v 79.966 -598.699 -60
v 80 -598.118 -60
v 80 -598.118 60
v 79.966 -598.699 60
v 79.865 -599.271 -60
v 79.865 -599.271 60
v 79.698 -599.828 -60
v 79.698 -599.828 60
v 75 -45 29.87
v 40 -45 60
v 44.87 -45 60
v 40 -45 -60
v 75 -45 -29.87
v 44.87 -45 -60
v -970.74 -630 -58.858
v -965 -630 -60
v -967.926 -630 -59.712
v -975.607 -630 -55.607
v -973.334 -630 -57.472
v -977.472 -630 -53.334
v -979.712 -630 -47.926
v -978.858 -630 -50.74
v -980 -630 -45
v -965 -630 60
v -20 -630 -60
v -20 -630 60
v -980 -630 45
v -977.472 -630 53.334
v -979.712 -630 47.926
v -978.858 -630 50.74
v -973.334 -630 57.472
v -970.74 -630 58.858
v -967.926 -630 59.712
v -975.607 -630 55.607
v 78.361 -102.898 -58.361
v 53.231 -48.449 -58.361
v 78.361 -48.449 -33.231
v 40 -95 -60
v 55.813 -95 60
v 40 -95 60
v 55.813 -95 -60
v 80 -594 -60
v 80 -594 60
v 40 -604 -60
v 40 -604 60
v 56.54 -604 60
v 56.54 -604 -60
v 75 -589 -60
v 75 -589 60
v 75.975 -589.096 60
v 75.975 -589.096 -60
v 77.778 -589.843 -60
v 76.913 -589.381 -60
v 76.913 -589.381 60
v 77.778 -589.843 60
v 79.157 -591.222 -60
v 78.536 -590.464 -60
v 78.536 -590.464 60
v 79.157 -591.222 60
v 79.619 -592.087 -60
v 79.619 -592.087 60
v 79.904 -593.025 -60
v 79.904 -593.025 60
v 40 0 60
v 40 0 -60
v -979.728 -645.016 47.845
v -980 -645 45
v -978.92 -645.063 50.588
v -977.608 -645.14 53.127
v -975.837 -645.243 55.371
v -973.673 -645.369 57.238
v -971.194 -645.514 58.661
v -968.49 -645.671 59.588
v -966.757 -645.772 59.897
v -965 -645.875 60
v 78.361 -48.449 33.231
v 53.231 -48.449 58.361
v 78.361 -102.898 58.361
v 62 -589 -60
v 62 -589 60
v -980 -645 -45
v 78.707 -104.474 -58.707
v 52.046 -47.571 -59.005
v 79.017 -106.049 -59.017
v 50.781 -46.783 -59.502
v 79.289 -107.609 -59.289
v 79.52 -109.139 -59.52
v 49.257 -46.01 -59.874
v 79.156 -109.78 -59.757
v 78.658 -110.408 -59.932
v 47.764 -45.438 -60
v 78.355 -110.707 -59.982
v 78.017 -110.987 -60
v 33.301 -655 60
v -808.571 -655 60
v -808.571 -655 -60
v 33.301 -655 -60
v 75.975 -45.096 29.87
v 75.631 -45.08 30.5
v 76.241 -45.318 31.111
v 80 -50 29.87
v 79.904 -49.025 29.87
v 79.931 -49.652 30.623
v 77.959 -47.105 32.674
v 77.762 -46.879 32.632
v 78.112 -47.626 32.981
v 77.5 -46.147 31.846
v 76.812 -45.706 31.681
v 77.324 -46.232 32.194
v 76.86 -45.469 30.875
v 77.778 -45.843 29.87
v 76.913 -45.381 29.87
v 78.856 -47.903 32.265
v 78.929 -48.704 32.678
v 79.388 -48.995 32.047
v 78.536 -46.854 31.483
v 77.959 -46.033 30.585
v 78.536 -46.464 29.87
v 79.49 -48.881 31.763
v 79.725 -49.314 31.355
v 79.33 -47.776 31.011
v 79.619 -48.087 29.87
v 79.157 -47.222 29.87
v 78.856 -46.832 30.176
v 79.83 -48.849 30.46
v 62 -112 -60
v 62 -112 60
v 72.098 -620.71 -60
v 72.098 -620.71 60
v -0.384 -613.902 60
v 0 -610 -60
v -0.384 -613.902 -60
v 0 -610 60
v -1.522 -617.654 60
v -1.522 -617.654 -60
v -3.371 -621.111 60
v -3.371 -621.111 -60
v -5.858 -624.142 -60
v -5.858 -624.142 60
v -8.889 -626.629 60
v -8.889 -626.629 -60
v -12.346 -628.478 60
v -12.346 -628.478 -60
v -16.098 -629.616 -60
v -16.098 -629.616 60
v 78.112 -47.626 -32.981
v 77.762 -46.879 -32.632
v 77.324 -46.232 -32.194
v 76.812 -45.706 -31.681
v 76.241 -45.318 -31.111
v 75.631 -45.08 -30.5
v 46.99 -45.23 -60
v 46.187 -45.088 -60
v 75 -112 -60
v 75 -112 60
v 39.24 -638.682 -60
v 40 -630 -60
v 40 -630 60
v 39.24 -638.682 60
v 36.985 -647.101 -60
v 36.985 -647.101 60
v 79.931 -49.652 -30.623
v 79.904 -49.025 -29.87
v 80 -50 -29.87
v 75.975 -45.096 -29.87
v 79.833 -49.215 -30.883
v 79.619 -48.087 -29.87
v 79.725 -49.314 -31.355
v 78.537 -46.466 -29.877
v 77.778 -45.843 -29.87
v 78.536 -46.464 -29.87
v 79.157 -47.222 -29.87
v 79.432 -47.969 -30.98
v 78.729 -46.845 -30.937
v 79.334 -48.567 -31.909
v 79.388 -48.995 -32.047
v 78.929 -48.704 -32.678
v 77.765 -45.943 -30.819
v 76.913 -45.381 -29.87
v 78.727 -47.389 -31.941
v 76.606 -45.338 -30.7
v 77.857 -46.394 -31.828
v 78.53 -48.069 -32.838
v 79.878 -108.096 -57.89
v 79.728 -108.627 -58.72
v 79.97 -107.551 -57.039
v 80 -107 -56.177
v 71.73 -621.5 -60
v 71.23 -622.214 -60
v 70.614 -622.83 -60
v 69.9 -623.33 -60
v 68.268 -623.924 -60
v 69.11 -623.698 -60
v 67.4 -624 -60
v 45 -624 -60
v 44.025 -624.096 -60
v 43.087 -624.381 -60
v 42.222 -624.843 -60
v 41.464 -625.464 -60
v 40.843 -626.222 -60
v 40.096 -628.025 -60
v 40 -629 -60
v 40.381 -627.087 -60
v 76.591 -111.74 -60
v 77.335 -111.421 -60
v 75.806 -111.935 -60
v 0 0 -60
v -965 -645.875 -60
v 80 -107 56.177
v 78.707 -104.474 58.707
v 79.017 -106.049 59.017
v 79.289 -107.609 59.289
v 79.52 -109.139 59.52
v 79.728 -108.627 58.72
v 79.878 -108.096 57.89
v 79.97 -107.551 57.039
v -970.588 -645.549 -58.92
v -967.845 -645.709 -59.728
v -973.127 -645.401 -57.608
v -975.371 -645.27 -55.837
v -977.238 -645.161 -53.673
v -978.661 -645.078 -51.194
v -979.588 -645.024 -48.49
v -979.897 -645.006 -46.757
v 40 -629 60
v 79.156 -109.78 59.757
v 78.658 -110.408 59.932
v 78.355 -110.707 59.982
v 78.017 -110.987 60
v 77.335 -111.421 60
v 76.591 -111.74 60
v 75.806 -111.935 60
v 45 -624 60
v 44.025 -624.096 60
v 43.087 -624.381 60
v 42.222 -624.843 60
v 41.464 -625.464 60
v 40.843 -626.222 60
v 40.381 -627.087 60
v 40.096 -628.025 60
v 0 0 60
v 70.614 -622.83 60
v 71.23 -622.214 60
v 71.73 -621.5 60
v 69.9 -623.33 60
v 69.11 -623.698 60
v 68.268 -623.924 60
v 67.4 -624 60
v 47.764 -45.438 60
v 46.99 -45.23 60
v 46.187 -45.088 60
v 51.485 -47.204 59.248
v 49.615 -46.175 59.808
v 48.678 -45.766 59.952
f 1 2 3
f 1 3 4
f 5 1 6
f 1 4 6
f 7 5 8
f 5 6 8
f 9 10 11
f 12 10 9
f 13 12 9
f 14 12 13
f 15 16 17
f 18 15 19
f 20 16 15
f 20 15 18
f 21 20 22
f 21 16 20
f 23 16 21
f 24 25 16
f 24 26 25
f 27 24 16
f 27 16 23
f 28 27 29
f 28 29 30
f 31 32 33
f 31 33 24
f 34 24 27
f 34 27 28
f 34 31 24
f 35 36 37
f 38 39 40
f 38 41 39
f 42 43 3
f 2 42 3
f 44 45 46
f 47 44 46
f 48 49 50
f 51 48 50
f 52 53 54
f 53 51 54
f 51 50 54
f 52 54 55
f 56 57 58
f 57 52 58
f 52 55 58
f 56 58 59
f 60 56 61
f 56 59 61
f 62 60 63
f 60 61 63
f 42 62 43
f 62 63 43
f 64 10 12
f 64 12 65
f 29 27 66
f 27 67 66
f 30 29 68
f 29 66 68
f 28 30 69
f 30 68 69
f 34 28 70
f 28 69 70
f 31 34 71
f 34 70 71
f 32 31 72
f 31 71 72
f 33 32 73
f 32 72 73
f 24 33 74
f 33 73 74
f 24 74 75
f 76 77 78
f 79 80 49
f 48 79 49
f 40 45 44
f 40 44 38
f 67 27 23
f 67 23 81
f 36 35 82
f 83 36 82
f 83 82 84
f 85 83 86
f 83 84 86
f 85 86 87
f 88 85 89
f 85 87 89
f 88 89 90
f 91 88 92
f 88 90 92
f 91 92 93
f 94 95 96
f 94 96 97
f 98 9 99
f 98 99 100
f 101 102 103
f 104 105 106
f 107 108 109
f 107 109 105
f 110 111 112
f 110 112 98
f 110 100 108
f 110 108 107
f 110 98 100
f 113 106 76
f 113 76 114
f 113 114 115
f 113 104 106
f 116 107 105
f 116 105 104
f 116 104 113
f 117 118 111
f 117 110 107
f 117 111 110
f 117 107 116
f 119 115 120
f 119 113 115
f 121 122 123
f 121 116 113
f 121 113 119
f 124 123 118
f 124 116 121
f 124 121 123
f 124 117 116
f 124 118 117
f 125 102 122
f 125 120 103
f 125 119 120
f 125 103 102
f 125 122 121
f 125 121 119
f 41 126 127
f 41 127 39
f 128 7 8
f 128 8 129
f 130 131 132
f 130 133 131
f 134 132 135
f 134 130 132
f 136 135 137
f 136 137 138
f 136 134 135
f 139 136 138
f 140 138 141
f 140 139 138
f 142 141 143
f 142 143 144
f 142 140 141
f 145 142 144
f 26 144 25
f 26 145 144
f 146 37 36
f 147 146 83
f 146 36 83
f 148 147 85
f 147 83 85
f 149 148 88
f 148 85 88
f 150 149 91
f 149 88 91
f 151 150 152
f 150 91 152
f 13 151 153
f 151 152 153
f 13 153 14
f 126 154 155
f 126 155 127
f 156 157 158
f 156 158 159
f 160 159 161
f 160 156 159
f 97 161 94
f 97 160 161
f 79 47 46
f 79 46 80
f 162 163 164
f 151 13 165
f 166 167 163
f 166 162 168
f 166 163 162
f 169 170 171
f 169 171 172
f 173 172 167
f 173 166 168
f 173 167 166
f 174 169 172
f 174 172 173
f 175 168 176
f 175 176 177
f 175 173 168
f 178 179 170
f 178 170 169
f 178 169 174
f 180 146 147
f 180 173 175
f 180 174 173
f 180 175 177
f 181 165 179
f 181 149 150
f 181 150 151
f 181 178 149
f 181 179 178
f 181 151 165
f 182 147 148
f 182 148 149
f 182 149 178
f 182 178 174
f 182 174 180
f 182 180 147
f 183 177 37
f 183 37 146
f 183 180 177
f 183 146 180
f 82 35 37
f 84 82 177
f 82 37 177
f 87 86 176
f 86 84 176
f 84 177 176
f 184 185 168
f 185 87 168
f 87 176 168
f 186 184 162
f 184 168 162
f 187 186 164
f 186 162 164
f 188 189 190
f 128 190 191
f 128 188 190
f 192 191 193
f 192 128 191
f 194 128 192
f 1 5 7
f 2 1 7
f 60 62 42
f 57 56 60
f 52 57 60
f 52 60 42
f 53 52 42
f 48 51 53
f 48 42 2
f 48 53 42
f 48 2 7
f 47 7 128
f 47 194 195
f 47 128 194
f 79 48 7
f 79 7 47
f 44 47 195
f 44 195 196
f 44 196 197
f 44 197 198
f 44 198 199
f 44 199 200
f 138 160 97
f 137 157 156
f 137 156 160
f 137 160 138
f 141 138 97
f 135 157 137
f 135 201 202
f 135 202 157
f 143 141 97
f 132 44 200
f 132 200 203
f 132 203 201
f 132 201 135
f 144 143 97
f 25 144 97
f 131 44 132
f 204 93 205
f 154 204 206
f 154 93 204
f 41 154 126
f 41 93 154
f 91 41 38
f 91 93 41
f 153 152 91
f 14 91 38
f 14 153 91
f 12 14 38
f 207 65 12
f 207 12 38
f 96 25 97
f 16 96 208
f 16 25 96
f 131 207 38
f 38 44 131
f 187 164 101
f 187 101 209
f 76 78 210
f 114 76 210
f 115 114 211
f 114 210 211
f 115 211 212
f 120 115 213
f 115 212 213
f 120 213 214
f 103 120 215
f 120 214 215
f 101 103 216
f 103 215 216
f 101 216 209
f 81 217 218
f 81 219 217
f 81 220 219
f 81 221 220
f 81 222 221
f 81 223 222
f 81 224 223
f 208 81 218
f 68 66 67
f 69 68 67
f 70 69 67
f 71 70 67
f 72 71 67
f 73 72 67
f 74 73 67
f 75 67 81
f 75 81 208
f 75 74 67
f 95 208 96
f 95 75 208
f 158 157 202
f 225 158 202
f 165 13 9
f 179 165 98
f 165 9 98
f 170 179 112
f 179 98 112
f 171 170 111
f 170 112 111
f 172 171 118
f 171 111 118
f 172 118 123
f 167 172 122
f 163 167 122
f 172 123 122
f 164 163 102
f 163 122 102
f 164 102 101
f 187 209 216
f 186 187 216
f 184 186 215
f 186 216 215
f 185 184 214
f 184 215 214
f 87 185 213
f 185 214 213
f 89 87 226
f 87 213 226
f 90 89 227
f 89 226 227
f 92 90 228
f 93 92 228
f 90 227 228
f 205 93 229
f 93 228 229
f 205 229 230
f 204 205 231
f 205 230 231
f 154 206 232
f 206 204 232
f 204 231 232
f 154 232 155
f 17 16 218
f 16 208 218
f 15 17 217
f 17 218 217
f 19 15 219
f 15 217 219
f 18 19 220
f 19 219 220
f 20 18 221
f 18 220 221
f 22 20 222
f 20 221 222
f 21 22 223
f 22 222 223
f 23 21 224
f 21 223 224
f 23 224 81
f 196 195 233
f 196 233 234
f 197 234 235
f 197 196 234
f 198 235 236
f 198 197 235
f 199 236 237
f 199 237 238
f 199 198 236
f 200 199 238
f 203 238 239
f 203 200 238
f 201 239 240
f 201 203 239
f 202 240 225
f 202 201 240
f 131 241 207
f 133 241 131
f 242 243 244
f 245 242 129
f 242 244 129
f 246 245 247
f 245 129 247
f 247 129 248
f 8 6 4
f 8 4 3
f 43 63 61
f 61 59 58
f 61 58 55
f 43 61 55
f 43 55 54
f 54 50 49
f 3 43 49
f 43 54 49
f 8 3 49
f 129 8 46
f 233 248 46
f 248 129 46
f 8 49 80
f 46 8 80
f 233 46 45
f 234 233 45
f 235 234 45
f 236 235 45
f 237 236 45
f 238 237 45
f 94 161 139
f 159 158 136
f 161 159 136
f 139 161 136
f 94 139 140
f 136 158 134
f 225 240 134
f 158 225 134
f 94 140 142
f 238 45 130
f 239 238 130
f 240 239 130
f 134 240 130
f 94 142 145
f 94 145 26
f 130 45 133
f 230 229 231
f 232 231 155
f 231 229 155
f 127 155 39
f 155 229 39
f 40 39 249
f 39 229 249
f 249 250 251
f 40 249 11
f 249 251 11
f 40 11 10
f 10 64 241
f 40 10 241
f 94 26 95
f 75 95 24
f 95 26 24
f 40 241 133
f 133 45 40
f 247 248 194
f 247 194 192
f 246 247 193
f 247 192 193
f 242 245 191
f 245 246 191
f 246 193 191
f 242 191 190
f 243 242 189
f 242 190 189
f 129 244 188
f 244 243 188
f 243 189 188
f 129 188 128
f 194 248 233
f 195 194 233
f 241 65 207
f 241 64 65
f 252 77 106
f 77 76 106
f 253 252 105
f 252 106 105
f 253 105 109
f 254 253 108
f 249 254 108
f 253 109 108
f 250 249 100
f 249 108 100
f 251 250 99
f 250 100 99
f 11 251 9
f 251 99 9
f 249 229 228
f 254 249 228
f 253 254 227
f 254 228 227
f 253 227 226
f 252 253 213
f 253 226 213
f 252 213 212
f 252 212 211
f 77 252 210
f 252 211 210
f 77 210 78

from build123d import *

# Parameters (mm, degrees)
BOSS_EXTRUDE1_DEPTH = 60
FILLET1_R           = 20
FILLET2_R           = 50
SKETCH2_W           = 848.571428571
SKETCH2_H           = 25
CUT_EXTRUDE1_DEPTH  = 1199.832765652
FILLET3_R           = 15
BOSS_EXTRUDE2_DEPTH = 60
CHAMFER1_START      = 59.982172039
CHAMFER1_OUTLINE_W  = 43
CHAMFER1_OUTLINE_H  = 75
CHAMFER1_DEPTH      = 21.017827961
CHAMFER2_START      = 59.982172039
CHAMFER2_OUTLINE_W  = 43
CHAMFER2_OUTLINE_H  = 75
CHAMFER2_DEPTH      = 21.017827961
FILLET4_R           = 5


with BuildPart() as part:
    # Sketch1 → Boss-Extrude1 (new, symmetric)
    with BuildSketch(Plane.XY):
        Polygon((0, 0), (0, -630), (-980, -630), (-980, -645), (-380, -680), (40, -680), (40, 0), align=None)
    extrude(amount=BOSS_EXTRUDE1_DEPTH, both=True)

    # Fillet1
    fillet1_edges = [part.edges().sort_by_distance(p)[0] for p in [
        (0, -630, 0),
    ]]
    fillet(fillet1_edges, radius=FILLET1_R)

    # Fillet2
    fillet2_edges = [part.edges().sort_by_distance(p)[0] for p in [
        (40, -680, 0),
    ]]
    fillet(fillet2_edges, radius=FILLET2_R)

    # Sketch2 → Cut-Extrude1 (cut, through all)
    with BuildSketch(Plane.XY.offset(60)):
        with Locations((-384.285714286, -667.5)):
            Rectangle(SKETCH2_W, SKETCH2_H)
    extrude(amount=-CUT_EXTRUDE1_DEPTH, mode=Mode.SUBTRACT)

    # Fillet3
    fillet3_edges = [part.edges().sort_by_distance(p)[0] for p in [
        (-980, -637.5, 60),
        (-980, -637.5, -60),
    ]]
    fillet(fillet3_edges, radius=FILLET3_R)

    # Sketch4 → Boss-Extrude2 (add, symmetric)
    with BuildSketch(Plane.XY):
        Polygon((40, -45), (80, -45), (80, -112), (62, -112), (55.812506017, -95), (40, -95), align=None)
        Polygon((40, -604), (56.540446486, -604), (62, -589), (80, -589), (80, -599), (70.900744143, -624), (40, -624), align=None)
    extrude(amount=BOSS_EXTRUDE2_DEPTH, both=True)

    # Chamfer1: read off the stored shape, not the designer's step
    # Chamfer1 outline → Chamfer1 (cut)
    with BuildSketch(Plane(origin=(0, 0, 0), x_dir=(0.74035690193716, -0.281696772444383, -0.6103430069628291), z_dir=(0.6722139969935248, 0.3102526139970119, 0.6722139969935248)).offset(CHAMFER1_START)):
        with Locations((33.5, -89.5)):
            Rectangle(CHAMFER1_OUTLINE_W, CHAMFER1_OUTLINE_H)
    extrude(amount=CHAMFER1_DEPTH, mode=Mode.SUBTRACT)

    # Chamfer2: read off the stored shape, not the designer's step
    # Chamfer2 outline → Chamfer2 (cut)
    with BuildSketch(Plane(origin=(0, 0, 0), x_dir=(0.74035690193716, -0.281696772444383, 0.6103430069628291), z_dir=(0.6722139969935248, 0.3102526139970119, -0.6722139969935248)).offset(CHAMFER2_START)):
        with Locations((33.5, 89.5)):
            Rectangle(CHAMFER2_OUTLINE_W, CHAMFER2_OUTLINE_H)
    extrude(amount=CHAMFER2_DEPTH, mode=Mode.SUBTRACT)

    # Fillet4
    # the kernel refuses this fillet: 5 mm, written as the material it adds along each edge
    with BuildSketch(Plane(origin=(40, -624, -60), x_dir=(1, 0, 0), z_dir=(0, 0, 1))) as fillet4_piece_1:
        with BuildLine():
            CenterArc((FILLET4_R, -FILLET4_R), FILLET4_R, 90, 90)
            Line((0, -FILLET4_R), (0, 0))
            Line((0, 0), (FILLET4_R, 0))
        make_face()
    extrude(amount=120)
    # the kernel refuses this fillet: 5 mm, written as the material it takes off along each edge
    with BuildSketch(Plane(origin=(75, -50, 29.869584766), x_dir=(0, 0.45647233632715695, -0.8897376052342775), z_dir=(0.7504731319703868, 0.5880284369504243, 0.30168300503707374))) as fillet4_2_piece_1_section:
        Polygon((-8.486724439, -8.486724439), (8.486724439, -8.486724439), (8.486724439, 8.486724439), (-8.486724439, 8.486724439), align=None)
    fillet4_2_piece_1 = extrude(amount=8.486724439, mode=Mode.PRIVATE)
    fillet4_2_piece_1 = split(fillet4_2_piece_1, bisect_by=Plane(origin=(75, -50, 29.869584766), z_dir=(0, 0.9079593845004515, -0.41905817746174745)), keep=Keep.TOP, mode=Mode.PRIVATE)
    fillet4_2_piece_1 = split(fillet4_2_piece_1, bisect_by=Plane(origin=(75, -50, 29.869584766), z_dir=(0.7071067811865476, 0, -0.7071067811865476)), keep=Keep.TOP, mode=Mode.PRIVATE)
    fillet4_2_piece_1 = split(fillet4_2_piece_1, bisect_by=Plane(origin=(75, -50, 29.869584766), z_dir=(0, 0, 1)), keep=Keep.TOP, mode=Mode.PRIVATE)
    fillet4_2_piece_1 = split(fillet4_2_piece_1, bisect_by=Plane(origin=(80, -50, 29.869584766), z_dir=(-1, 0, 0)), keep=Keep.TOP, mode=Mode.PRIVATE)
    fillet4_2_piece_1 = split(fillet4_2_piece_1, bisect_by=Plane(origin=(78.361069985, -48.44873693, 33.230654751), z_dir=(-0.6722139969935248, -0.3102526139970119, -0.6722139969935248)), keep=Keep.TOP, mode=Mode.PRIVATE)
    fillet4_2_piece_1 = split(fillet4_2_piece_1, bisect_by=Plane(origin=(75, -45, 29.869584766), z_dir=(0, -1, 0)), keep=Keep.TOP, mode=Mode.PRIVATE)
    fillet4_2_piece_1 = fillet4_2_piece_1 - Plane(origin=(75, -50, 29.869584766), x_dir=(-0.7504731319703868, -0.5880284369504243, -0.30168300503707374), z_dir=(0, 0.45647233632715695, -0.8897376052342775)) * Sphere(FILLET4_R, mode=Mode.PRIVATE)
    add(fillet4_2_piece_1, mode=Mode.SUBTRACT)
    with BuildSketch(Plane(origin=(75, -50, -29.869584766), x_dir=(-0.6608271381079537, 0.6608271381079537, -0.3558299974427439), z_dir=(0.7504731319703868, 0.5880284369504243, -0.30168300503707374))) as fillet4_2_piece_2_section:
        Polygon((-8.486724439, -8.486724439), (8.486724439, -8.486724439), (8.486724439, 8.486724439), (-8.486724439, 8.486724439), align=None)
    fillet4_2_piece_2 = extrude(amount=8.486724439, mode=Mode.PRIVATE)
    fillet4_2_piece_2 = split(fillet4_2_piece_2, bisect_by=Plane(origin=(75, -50, -29.869584766), z_dir=(0, 0.9079593845004515, 0.41905817746174745)), keep=Keep.TOP, mode=Mode.PRIVATE)
    fillet4_2_piece_2 = split(fillet4_2_piece_2, bisect_by=Plane(origin=(75, -50, -29.869584766), z_dir=(0, 0, -1)), keep=Keep.TOP, mode=Mode.PRIVATE)
    fillet4_2_piece_2 = split(fillet4_2_piece_2, bisect_by=Plane(origin=(75, -50, -29.869584766), z_dir=(0.7071067811865476, 0, 0.7071067811865476)), keep=Keep.TOP, mode=Mode.PRIVATE)
    fillet4_2_piece_2 = split(fillet4_2_piece_2, bisect_by=Plane(origin=(78.361069985, -48.44873693, -33.230654751), z_dir=(-0.6722139969935248, -0.3102526139970119, 0.6722139969935248)), keep=Keep.TOP, mode=Mode.PRIVATE)
    fillet4_2_piece_2 = split(fillet4_2_piece_2, bisect_by=Plane(origin=(80, -50, -29.869584766), z_dir=(-1, 0, 0)), keep=Keep.TOP, mode=Mode.PRIVATE)
    fillet4_2_piece_2 = split(fillet4_2_piece_2, bisect_by=Plane(origin=(75, -45, -29.869584766), z_dir=(0, -1, 0)), keep=Keep.TOP, mode=Mode.PRIVATE)
    fillet4_2_piece_2 = fillet4_2_piece_2 - Plane(origin=(75, -50, -29.869584766), x_dir=(-0.7504731319703868, -0.5880284369504243, 0.30168300503707374), z_dir=(-0.6608271381079537, 0.6608271381079537, -0.3558299974427439)) * Sphere(FILLET4_R, mode=Mode.PRIVATE)
    add(fillet4_2_piece_2, mode=Mode.SUBTRACT)
    with BuildSketch(Plane(origin=(82.319175466, -115.024880177, 60), x_dir=(-0.9079593845004514, -0.4190581774617474, 0), z_dir=(-0.41905817746174745, 0.9079593845004515, 0))) as fillet4_2_piece_3:
        with BuildLine():
            CenterArc((FILLET4_R * 0.4427405244, -FILLET4_R), FILLET4_R, 90, 47.761827017)
            Line((-FILLET4_R * 0.297616377538, -FILLET4_R * 0.327786003006), (0, 0))
            Line((0, 0), (FILLET4_R * 0.4427405244, 0))
        make_face()
    extrude(amount=82.657618428, mode=Mode.SUBTRACT)
    with BuildSketch(Plane(origin=(80, -45, 29.869584766), x_dir=(-1, 0, 0), z_dir=(0, 0, -1))) as fillet4_2_piece_4:
        with BuildLine():
            CenterArc((FILLET4_R, -FILLET4_R), FILLET4_R, 90, 90)
            Line((0, -FILLET4_R), (0, 0))
            Line((0, 0), (FILLET4_R, 0))
        make_face()
    extrude(amount=59.739169533, mode=Mode.SUBTRACT)
    with BuildSketch(Plane(origin=(80, -115.024880177, 62.319175466), x_dir=(0, -0.41905817746174745, -0.9079593845004515), z_dir=(0, 0.9079593845004515, -0.41905817746174745))) as fillet4_2_piece_5:
        with BuildLine():
            CenterArc((FILLET4_R * 0.4427405244, FILLET4_R), FILLET4_R, 222.238172983, 47.761827017)
            Line((-FILLET4_R * 0.297616377538, FILLET4_R * 0.327786003006), (0, 0))
            Line((0, 0), (FILLET4_R * 0.4427405244, 0))
        make_face()
    extrude(amount=72.63821652, mode=Mode.SUBTRACT)
    with BuildSketch(Plane(origin=(77.565207617, -45, 32.434792383), x_dir=(-0.7071067811865476, 0, -0.7071067811865476), z_dir=(-0.7071067811865476, 0, 0.7071067811865476)), Plane(origin=(43.586980958, -45, -66.413019041), x_dir=(-0.7071067811865476, 0, 0.7071067811865476), z_dir=(0.7071067811865476, 0, 0.7071067811865476))) as fillet4_2_piece_6:
        with BuildLine():
            CenterArc((FILLET4_R * 0.725550280312, FILLET4_R), FILLET4_R, 198.074454838, 71.925545162)
            Line((-FILLET4_R * 0.225103871053, FILLET4_R * 0.689747386003), (0, 0))
            Line((0, 0), (FILLET4_R * 0.725550280312, 0))
        make_face()
    extrude(amount=48.052468966, mode=Mode.SUBTRACT)
    with BuildSketch(Plane(origin=(80, -49.072329814, -31.879536837), x_dir=(-0.7403569019371568, 0.2816967724443845, -0.6103430069628323), z_dir=(0, -0.9079593845004515, -0.41905817746174745))) as fillet4_2_piece_7:
        with BuildLine():
            CenterArc((FILLET4_R * 0.4427405244, -FILLET4_R), FILLET4_R, 90, 47.761827017)
            Line((-FILLET4_R * 0.297616377538, -FILLET4_R * 0.327786003006), (0, 0))
            Line((0, 0), (FILLET4_R * 0.4427405244, 0))
        make_face()
    extrude(amount=72.63821652, mode=Mode.SUBTRACT)
    with BuildSketch(Plane(origin=(82.319175466, -115.024880177, -60), x_dir=(-0.9079593845004514, -0.4190581774617474, 0), z_dir=(-0.41905817746174745, 0.9079593845004515, 0))) as fillet4_2_piece_8:
        with BuildLine():
            CenterArc((FILLET4_R * 0.4427405244, FILLET4_R), FILLET4_R, 222.238172983, 47.761827017)
            Line((-FILLET4_R * 0.297616377538, FILLET4_R * 0.327786003006), (0, 0))
            Line((0, 0), (FILLET4_R * 0.4427405244, 0))
        make_face()
    extrude(amount=82.657618428, mode=Mode.SUBTRACT)
    with BuildSketch(Plane(origin=(80, -112, 72.5), x_dir=(0, 1, 0), z_dir=(0, 0, -1)), Plane(origin=(80, -589, 72.5), x_dir=(-1, 0, 0), z_dir=(0, 0, -1))) as fillet4_2_piece_9:
        with BuildLine():
            CenterArc((FILLET4_R, -FILLET4_R), FILLET4_R, 90, 90)
            Line((0, -FILLET4_R), (0, 0))
            Line((0, 0), (FILLET4_R, 0))
        make_face()
    extrude(amount=145, mode=Mode.SUBTRACT)
    with BuildSketch(Plane(origin=(70.900744143, -624, -68.752594228), x_dir=(0.34202014332566244, 0.9396926207859106, 0), z_dir=(0, 0, 1))) as fillet4_2_piece_10:
        with BuildLine():
            CenterArc((FILLET4_R * 0.70020753821, FILLET4_R), FILLET4_R, 200, 70)
            Line((-FILLET4_R * 0.239485082576, FILLET4_R * 0.657979856674), (0, 0))
            Line((0, 0), (FILLET4_R * 0.70020753821, 0))
        make_face()
    extrude(amount=137.505188455, mode=Mode.SUBTRACT)
    with BuildSketch(Plane(origin=(80, -599, 62.204087259), x_dir=(0, 1, 0), z_dir=(0, 0, -1))) as fillet4_2_piece_11:
        with BuildLine():
            CenterArc((FILLET4_R * 0.176326980708, -FILLET4_R), FILLET4_R, 90, 20)
            Line((-FILLET4_R * 0.165693162617, -FILLET4_R * 0.0603073792141), (0, 0))
            Line((0, 0), (FILLET4_R * 0.176326980708, 0))
        make_face()
    extrude(amount=124.408174518, mode=Mode.SUBTRACT)


solid = part.part
